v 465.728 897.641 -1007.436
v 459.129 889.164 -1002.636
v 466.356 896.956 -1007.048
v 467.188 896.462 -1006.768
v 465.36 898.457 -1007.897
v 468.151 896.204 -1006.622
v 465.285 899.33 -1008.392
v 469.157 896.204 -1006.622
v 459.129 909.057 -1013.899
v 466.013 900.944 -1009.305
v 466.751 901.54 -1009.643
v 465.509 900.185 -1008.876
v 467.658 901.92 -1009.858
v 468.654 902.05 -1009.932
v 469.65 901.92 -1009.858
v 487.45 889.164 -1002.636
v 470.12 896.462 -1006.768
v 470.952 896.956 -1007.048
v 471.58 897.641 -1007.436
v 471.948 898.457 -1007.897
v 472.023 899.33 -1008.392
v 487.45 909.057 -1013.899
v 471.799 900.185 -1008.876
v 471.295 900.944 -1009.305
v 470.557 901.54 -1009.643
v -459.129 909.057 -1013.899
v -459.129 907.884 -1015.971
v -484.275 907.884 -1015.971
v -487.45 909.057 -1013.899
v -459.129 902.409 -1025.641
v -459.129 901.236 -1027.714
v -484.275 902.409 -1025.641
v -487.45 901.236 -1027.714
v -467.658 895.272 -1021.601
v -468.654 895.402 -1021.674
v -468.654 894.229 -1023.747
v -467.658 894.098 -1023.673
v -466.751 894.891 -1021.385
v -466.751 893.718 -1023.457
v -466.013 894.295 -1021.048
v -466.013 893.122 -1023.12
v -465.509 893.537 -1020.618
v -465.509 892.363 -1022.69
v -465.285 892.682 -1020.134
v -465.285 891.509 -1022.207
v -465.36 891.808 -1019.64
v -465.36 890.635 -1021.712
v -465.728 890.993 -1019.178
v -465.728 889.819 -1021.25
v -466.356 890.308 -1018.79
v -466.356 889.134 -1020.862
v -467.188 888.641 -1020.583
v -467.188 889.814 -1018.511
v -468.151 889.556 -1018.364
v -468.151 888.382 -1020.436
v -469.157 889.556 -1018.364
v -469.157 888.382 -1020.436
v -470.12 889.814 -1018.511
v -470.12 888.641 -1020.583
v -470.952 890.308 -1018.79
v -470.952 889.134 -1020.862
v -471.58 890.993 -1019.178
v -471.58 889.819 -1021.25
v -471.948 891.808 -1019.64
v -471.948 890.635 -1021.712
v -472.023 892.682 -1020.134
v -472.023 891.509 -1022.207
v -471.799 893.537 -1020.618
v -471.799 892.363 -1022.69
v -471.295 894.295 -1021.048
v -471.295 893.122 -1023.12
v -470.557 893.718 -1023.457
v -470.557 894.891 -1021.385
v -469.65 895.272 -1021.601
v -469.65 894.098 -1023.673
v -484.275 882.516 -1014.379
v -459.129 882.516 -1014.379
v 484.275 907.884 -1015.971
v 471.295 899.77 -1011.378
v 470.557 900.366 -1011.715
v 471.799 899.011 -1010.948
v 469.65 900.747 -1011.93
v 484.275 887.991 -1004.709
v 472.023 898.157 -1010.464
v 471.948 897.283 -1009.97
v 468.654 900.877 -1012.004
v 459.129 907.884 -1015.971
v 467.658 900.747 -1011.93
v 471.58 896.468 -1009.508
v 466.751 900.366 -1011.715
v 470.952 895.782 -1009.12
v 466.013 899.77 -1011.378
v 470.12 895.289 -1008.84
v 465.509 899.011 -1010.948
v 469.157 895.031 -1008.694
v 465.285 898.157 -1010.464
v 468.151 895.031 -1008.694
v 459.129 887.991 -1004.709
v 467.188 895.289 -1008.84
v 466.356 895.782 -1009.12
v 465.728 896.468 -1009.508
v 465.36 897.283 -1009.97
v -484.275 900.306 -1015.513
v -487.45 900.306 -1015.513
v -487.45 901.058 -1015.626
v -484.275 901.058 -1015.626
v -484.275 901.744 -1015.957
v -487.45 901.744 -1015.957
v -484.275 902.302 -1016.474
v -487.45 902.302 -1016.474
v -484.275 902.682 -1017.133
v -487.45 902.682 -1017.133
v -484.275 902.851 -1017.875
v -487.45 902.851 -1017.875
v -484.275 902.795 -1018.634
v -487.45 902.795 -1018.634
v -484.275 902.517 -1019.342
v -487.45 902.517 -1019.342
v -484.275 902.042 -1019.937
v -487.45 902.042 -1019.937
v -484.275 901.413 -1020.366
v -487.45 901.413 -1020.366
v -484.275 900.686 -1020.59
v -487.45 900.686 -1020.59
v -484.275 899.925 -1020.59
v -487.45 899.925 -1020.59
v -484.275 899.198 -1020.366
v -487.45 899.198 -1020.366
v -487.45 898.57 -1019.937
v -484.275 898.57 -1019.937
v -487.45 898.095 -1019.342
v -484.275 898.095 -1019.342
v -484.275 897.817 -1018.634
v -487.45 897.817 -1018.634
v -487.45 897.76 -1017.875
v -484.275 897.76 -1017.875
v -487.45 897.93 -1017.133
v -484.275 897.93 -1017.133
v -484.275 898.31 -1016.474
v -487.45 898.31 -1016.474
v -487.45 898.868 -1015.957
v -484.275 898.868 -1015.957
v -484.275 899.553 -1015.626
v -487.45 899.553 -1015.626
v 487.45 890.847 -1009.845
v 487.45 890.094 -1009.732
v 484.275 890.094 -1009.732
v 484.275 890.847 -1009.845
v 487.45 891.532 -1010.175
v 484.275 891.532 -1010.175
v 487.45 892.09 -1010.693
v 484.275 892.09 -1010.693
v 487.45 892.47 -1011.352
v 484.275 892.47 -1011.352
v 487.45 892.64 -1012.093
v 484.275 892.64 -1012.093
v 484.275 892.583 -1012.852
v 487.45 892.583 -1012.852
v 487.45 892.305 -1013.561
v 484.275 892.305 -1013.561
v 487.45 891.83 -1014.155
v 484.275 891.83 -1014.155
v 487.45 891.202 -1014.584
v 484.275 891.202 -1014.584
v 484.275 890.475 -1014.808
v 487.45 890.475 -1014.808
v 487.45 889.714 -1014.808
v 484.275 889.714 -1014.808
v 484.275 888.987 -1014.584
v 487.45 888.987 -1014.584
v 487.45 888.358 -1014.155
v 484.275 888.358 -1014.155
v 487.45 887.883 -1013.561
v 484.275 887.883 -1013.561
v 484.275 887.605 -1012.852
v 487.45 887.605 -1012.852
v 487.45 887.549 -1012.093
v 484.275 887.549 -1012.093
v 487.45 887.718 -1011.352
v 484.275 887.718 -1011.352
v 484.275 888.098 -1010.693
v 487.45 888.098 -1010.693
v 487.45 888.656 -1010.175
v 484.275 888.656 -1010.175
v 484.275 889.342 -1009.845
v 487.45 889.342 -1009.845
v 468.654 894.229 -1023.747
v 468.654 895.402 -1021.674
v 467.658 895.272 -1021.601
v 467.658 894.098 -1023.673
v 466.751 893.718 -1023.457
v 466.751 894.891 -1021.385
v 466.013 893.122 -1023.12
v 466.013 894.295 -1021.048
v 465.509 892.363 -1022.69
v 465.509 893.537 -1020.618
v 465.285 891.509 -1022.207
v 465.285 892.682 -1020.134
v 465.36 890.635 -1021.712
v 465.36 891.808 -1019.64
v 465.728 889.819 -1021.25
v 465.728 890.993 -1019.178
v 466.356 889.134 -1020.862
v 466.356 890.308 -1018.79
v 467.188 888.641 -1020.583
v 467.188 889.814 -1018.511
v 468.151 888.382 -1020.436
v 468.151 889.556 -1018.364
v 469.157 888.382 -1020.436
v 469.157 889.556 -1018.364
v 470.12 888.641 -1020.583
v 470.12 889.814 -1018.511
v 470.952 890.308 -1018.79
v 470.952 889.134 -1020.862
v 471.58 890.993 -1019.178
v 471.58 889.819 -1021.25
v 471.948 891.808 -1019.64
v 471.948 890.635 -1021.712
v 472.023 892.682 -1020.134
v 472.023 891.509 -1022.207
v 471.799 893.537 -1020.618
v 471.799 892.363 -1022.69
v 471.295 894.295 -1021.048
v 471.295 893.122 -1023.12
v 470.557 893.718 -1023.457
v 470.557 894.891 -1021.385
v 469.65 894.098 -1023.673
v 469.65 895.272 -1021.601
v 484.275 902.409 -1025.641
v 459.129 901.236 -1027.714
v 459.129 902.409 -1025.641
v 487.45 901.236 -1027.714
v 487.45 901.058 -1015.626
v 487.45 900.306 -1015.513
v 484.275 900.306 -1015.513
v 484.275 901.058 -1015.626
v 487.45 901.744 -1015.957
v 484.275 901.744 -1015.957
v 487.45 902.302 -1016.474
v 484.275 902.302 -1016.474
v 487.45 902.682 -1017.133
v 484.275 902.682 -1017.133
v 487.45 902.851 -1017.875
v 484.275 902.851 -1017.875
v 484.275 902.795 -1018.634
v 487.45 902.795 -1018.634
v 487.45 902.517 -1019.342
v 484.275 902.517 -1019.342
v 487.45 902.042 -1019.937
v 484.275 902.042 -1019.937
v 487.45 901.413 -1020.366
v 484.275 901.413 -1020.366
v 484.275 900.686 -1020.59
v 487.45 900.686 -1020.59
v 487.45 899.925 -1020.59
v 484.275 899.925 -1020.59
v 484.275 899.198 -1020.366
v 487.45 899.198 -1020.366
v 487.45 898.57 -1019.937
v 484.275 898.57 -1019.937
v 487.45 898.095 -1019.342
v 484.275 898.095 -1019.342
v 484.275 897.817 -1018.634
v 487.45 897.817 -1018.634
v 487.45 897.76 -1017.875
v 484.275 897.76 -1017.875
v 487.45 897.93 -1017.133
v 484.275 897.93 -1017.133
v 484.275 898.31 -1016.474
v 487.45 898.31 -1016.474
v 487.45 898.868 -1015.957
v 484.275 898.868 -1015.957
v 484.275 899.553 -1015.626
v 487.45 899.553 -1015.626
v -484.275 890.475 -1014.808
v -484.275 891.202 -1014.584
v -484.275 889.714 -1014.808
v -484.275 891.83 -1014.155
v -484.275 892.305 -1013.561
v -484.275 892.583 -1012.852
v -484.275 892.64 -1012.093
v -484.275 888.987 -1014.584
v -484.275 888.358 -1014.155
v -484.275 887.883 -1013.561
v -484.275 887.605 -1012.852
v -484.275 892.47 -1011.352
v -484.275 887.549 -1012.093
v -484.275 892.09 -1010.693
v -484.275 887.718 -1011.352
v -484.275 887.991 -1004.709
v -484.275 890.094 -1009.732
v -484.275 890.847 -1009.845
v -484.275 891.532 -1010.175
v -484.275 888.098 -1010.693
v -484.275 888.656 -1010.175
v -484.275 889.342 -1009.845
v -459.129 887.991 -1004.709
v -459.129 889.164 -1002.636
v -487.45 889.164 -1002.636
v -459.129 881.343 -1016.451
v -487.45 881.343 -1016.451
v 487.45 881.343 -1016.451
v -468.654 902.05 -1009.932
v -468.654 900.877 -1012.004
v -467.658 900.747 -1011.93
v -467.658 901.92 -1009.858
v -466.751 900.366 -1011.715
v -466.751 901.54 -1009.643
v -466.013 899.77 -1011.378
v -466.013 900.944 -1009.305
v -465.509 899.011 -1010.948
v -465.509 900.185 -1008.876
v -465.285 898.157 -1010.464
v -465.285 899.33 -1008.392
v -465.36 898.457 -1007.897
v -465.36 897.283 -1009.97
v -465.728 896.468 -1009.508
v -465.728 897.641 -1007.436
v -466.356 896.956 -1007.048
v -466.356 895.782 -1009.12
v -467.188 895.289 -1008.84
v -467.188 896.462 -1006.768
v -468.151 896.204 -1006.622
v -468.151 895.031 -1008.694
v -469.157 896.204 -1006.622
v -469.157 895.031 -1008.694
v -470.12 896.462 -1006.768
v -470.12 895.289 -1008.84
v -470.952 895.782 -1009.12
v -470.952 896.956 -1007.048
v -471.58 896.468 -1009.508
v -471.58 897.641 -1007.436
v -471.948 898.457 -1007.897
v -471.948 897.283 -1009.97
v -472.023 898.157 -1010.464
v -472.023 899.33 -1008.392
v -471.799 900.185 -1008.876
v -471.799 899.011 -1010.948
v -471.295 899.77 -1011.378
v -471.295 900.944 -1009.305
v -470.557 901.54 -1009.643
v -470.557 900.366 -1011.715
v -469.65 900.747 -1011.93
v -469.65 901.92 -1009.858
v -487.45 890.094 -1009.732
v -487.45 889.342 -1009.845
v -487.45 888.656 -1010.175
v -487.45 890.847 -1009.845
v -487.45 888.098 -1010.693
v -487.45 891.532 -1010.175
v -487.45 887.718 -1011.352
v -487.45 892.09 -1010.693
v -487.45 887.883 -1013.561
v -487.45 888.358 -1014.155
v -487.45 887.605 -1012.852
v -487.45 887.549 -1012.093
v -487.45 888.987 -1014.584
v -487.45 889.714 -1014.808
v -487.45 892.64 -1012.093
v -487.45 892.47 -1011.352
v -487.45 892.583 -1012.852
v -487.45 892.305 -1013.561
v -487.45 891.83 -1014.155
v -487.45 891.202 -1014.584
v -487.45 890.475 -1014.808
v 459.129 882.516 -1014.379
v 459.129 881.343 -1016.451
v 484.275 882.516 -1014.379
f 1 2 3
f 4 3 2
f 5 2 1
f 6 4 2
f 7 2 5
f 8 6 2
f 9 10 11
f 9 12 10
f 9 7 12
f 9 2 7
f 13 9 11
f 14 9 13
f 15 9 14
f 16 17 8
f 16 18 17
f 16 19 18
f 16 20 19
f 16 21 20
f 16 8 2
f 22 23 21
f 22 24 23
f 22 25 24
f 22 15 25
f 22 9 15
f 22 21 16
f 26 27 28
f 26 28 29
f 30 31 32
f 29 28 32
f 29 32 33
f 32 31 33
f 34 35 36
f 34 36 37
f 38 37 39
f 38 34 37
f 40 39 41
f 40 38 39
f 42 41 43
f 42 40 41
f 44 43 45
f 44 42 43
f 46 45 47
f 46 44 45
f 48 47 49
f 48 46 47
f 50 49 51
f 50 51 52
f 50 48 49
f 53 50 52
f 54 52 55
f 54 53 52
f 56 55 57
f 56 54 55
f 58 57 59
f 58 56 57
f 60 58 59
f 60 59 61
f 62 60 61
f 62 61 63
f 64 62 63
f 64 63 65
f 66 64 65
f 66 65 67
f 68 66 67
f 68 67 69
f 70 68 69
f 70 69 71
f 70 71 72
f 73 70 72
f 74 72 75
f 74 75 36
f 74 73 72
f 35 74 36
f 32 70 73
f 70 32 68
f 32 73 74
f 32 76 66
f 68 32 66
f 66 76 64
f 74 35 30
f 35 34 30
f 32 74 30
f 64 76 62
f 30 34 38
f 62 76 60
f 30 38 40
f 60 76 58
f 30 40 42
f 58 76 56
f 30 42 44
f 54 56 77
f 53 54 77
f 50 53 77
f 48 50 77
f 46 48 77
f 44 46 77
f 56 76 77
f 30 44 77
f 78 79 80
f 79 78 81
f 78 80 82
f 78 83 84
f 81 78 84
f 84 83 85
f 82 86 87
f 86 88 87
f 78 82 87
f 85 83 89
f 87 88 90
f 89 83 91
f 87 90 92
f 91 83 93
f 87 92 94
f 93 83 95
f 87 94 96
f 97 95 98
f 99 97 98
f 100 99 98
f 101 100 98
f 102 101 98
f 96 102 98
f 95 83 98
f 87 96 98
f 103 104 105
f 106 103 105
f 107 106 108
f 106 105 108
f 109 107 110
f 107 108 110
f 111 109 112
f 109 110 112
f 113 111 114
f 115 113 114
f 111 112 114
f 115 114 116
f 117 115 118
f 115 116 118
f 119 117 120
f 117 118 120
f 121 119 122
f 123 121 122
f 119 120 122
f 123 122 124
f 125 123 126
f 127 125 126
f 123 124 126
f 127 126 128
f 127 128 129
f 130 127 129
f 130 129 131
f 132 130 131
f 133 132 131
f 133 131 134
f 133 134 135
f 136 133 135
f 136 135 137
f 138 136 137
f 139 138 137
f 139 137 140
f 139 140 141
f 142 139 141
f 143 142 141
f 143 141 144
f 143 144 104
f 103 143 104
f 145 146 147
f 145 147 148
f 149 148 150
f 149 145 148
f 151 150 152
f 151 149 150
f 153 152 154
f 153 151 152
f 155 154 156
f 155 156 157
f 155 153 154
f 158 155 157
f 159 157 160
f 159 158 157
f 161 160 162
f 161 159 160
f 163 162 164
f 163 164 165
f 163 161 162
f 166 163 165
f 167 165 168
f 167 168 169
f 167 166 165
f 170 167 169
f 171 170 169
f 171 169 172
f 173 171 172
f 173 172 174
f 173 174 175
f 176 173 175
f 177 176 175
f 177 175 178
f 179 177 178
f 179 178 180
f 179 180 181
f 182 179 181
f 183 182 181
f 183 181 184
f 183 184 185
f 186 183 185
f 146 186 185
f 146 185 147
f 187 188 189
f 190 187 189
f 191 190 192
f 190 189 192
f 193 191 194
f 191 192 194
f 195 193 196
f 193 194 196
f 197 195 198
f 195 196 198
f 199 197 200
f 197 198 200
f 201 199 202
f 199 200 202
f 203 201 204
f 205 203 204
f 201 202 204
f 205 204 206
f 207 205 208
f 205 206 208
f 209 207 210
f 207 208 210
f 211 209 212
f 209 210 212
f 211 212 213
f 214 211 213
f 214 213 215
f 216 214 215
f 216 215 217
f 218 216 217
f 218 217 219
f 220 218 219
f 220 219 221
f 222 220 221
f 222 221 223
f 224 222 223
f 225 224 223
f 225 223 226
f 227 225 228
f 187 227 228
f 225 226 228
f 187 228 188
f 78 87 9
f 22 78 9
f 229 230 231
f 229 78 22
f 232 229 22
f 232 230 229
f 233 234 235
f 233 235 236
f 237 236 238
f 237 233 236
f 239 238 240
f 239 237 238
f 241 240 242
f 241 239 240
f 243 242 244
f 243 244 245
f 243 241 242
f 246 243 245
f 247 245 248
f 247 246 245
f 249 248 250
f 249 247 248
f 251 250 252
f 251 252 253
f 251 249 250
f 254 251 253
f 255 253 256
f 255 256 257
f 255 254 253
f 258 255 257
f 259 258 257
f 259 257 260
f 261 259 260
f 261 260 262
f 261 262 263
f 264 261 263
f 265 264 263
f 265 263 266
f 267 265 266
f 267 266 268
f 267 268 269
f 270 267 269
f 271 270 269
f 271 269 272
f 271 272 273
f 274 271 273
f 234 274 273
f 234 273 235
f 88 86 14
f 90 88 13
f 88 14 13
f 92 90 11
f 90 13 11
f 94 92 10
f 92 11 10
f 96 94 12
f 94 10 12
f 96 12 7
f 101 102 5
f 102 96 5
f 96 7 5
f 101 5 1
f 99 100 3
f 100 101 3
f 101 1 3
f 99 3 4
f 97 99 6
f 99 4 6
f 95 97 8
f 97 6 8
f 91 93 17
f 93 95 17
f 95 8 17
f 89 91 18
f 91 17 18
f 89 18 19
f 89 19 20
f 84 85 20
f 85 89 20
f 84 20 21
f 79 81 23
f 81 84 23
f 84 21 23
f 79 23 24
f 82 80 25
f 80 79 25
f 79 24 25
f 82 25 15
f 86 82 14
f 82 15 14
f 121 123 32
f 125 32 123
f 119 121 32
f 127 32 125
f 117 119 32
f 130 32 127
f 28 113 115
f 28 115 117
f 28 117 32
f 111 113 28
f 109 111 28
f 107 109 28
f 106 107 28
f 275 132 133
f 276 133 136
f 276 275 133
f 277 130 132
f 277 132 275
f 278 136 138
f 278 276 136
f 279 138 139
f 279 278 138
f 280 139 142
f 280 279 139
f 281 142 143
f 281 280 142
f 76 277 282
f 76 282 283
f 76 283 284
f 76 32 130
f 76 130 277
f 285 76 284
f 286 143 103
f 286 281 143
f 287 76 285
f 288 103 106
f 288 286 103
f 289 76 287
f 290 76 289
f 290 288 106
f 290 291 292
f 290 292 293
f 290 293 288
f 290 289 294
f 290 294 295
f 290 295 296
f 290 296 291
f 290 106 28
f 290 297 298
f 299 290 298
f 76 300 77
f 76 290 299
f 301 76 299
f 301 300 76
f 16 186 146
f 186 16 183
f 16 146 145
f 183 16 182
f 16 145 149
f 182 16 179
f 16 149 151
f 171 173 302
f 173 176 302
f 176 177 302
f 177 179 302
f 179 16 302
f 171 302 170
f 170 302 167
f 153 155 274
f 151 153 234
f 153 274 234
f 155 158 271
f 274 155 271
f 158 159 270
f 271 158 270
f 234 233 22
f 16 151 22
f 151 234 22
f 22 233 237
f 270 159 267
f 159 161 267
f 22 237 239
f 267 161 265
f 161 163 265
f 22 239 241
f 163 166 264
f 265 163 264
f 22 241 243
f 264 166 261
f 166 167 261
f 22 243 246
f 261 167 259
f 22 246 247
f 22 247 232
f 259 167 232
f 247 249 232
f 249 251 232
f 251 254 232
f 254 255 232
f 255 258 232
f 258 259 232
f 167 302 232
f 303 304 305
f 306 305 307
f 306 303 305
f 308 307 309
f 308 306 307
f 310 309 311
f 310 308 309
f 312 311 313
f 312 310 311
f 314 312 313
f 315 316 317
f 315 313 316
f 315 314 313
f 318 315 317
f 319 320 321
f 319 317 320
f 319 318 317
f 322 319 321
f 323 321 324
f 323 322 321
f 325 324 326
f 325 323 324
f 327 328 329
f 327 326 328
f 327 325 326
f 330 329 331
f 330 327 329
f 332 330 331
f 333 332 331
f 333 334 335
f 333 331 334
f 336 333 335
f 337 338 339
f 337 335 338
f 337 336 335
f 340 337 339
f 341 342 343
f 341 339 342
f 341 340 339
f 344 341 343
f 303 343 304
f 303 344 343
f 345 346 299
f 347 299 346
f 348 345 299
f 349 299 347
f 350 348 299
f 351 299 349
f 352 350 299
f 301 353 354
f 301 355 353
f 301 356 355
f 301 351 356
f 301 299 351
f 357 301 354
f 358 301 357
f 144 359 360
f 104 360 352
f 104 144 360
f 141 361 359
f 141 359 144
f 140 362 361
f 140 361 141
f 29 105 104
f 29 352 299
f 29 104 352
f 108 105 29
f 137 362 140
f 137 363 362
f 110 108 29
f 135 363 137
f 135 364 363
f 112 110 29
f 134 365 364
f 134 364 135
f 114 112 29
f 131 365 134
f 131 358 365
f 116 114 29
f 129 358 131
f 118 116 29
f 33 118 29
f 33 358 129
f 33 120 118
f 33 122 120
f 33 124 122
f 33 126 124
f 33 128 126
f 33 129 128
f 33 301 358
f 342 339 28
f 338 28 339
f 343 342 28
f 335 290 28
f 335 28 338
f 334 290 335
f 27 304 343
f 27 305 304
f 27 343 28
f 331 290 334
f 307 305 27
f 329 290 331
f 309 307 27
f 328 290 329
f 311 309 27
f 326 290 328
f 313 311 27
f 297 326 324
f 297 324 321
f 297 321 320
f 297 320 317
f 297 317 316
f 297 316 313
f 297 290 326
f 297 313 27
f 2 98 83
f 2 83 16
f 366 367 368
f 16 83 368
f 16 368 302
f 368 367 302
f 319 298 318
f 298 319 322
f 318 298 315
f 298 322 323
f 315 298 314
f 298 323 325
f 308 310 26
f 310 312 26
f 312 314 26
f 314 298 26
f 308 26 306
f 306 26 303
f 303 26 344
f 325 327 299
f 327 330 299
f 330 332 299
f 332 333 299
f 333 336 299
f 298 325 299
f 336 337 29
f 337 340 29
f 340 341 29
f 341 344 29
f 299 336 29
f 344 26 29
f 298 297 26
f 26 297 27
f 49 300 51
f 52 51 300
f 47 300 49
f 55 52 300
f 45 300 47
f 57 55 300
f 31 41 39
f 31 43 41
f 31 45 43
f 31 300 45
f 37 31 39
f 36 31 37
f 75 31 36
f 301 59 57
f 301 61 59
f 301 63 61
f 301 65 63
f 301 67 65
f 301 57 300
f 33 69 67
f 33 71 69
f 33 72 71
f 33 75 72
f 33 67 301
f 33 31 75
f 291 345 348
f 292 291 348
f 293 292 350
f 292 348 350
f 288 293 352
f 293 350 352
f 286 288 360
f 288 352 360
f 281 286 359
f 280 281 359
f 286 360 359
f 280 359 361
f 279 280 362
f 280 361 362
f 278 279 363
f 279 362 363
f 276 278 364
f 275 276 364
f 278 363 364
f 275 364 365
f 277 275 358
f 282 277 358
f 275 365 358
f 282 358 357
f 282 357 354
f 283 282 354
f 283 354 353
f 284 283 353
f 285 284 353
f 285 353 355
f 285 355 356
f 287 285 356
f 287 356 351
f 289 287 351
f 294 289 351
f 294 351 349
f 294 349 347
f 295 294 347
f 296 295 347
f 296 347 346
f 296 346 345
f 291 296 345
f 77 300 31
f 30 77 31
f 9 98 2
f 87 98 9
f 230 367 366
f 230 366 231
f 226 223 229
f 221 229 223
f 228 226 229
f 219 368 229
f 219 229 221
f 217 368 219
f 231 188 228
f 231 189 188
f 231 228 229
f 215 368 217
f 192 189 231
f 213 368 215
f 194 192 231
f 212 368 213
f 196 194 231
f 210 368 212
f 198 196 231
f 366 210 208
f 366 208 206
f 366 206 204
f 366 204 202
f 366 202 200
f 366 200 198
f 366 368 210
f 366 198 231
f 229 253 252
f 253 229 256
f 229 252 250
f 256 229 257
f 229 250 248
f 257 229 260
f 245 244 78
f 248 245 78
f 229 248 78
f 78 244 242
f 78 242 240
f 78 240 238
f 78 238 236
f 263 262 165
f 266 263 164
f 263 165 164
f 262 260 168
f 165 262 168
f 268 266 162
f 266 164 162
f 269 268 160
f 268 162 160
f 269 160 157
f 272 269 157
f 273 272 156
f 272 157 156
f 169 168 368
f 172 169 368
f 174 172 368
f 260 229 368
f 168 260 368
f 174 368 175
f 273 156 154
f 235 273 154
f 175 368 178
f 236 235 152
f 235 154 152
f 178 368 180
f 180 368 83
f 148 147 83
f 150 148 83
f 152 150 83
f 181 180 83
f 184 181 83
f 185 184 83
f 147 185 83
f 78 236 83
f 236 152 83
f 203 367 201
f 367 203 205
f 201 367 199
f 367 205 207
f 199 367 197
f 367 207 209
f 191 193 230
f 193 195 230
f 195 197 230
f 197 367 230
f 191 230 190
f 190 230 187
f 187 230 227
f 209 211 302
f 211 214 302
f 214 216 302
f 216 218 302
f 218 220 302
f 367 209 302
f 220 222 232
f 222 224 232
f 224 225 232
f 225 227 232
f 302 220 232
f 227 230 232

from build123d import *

# Parameters (mm, degrees)
SKETCH1_W           = 28.321
SKETCH1_H           = 22.86
SKETCH1_R           = 3.3782
BOSS_EXTRUDE1_DEPTH = 7.9375
SKETCH2_W           = 31.794417924
SKETCH2_H           = 11.1125
CUT_EXTRUDE1_DEPTH  = 671.322198878
SKETCH3_R           = 2.5527
CUT_EXTRUDE2_DEPTH  = 1373.363784194


with BuildPart() as part:
    # Sketch1 → Boss-Extrude1 (new, symmetric)
    with BuildSketch(Plane(origin=(0, -217.945214779, -384.948202745), x_dir=(-1, 0, 0), z_dir=(0, -0.4926838295770631, -0.8702083911760905))):
        with Locations((473.289499952, 1279.170858512)):
            Rectangle(SKETCH1_W, SKETCH1_H)
        with Locations(Location((468.653999952, 1279.170858512, 0), (0, 0, 90))):
            Circle(SKETCH1_R, mode=Mode.SUBTRACT)
    extrude(amount=BOSS_EXTRUDE1_DEPTH, both=True)

    # Sketch2 → Cut-Extrude1 (cut, through all)
    with BuildSketch(Plane(origin=(0, 1103.198732914, -624.595421083), x_dir=(1, 0, 0), z_dir=(0, -0.8702083911760902, 0.4926838295770632))):
        with Locations((-468.37779099, -442.363239252)):
            Rectangle(SKETCH2_W, SKETCH2_H)
    extrude(amount=-CUT_EXTRUDE1_DEPTH, mode=Mode.SUBTRACT)

    # Sketch3 → Cut-Extrude2 (cut, through all)
    with BuildSketch(Plane.ZY.offset(487.449999952)):
        with Locations((-1018.065773102, 900.30586076)):
            Circle(SKETCH3_R)
        with Locations((-1012.284226898, 890.094139332)):
            Circle(SKETCH3_R)
        with Locations((0, 890.821943017)):
            Circle(SKETCH3_R)
    extrude(amount=-CUT_EXTRUDE2_DEPTH, mode=Mode.SUBTRACT)


with BuildPart() as body_2:
    # Mirror2: mirrored copy
    add(part.part.mirror(Plane(origin=(0, 0, 0), x_dir=(0, 0, 1), z_dir=(1, 0, 0))))


solid = Compound([part.part, body_2.part])
